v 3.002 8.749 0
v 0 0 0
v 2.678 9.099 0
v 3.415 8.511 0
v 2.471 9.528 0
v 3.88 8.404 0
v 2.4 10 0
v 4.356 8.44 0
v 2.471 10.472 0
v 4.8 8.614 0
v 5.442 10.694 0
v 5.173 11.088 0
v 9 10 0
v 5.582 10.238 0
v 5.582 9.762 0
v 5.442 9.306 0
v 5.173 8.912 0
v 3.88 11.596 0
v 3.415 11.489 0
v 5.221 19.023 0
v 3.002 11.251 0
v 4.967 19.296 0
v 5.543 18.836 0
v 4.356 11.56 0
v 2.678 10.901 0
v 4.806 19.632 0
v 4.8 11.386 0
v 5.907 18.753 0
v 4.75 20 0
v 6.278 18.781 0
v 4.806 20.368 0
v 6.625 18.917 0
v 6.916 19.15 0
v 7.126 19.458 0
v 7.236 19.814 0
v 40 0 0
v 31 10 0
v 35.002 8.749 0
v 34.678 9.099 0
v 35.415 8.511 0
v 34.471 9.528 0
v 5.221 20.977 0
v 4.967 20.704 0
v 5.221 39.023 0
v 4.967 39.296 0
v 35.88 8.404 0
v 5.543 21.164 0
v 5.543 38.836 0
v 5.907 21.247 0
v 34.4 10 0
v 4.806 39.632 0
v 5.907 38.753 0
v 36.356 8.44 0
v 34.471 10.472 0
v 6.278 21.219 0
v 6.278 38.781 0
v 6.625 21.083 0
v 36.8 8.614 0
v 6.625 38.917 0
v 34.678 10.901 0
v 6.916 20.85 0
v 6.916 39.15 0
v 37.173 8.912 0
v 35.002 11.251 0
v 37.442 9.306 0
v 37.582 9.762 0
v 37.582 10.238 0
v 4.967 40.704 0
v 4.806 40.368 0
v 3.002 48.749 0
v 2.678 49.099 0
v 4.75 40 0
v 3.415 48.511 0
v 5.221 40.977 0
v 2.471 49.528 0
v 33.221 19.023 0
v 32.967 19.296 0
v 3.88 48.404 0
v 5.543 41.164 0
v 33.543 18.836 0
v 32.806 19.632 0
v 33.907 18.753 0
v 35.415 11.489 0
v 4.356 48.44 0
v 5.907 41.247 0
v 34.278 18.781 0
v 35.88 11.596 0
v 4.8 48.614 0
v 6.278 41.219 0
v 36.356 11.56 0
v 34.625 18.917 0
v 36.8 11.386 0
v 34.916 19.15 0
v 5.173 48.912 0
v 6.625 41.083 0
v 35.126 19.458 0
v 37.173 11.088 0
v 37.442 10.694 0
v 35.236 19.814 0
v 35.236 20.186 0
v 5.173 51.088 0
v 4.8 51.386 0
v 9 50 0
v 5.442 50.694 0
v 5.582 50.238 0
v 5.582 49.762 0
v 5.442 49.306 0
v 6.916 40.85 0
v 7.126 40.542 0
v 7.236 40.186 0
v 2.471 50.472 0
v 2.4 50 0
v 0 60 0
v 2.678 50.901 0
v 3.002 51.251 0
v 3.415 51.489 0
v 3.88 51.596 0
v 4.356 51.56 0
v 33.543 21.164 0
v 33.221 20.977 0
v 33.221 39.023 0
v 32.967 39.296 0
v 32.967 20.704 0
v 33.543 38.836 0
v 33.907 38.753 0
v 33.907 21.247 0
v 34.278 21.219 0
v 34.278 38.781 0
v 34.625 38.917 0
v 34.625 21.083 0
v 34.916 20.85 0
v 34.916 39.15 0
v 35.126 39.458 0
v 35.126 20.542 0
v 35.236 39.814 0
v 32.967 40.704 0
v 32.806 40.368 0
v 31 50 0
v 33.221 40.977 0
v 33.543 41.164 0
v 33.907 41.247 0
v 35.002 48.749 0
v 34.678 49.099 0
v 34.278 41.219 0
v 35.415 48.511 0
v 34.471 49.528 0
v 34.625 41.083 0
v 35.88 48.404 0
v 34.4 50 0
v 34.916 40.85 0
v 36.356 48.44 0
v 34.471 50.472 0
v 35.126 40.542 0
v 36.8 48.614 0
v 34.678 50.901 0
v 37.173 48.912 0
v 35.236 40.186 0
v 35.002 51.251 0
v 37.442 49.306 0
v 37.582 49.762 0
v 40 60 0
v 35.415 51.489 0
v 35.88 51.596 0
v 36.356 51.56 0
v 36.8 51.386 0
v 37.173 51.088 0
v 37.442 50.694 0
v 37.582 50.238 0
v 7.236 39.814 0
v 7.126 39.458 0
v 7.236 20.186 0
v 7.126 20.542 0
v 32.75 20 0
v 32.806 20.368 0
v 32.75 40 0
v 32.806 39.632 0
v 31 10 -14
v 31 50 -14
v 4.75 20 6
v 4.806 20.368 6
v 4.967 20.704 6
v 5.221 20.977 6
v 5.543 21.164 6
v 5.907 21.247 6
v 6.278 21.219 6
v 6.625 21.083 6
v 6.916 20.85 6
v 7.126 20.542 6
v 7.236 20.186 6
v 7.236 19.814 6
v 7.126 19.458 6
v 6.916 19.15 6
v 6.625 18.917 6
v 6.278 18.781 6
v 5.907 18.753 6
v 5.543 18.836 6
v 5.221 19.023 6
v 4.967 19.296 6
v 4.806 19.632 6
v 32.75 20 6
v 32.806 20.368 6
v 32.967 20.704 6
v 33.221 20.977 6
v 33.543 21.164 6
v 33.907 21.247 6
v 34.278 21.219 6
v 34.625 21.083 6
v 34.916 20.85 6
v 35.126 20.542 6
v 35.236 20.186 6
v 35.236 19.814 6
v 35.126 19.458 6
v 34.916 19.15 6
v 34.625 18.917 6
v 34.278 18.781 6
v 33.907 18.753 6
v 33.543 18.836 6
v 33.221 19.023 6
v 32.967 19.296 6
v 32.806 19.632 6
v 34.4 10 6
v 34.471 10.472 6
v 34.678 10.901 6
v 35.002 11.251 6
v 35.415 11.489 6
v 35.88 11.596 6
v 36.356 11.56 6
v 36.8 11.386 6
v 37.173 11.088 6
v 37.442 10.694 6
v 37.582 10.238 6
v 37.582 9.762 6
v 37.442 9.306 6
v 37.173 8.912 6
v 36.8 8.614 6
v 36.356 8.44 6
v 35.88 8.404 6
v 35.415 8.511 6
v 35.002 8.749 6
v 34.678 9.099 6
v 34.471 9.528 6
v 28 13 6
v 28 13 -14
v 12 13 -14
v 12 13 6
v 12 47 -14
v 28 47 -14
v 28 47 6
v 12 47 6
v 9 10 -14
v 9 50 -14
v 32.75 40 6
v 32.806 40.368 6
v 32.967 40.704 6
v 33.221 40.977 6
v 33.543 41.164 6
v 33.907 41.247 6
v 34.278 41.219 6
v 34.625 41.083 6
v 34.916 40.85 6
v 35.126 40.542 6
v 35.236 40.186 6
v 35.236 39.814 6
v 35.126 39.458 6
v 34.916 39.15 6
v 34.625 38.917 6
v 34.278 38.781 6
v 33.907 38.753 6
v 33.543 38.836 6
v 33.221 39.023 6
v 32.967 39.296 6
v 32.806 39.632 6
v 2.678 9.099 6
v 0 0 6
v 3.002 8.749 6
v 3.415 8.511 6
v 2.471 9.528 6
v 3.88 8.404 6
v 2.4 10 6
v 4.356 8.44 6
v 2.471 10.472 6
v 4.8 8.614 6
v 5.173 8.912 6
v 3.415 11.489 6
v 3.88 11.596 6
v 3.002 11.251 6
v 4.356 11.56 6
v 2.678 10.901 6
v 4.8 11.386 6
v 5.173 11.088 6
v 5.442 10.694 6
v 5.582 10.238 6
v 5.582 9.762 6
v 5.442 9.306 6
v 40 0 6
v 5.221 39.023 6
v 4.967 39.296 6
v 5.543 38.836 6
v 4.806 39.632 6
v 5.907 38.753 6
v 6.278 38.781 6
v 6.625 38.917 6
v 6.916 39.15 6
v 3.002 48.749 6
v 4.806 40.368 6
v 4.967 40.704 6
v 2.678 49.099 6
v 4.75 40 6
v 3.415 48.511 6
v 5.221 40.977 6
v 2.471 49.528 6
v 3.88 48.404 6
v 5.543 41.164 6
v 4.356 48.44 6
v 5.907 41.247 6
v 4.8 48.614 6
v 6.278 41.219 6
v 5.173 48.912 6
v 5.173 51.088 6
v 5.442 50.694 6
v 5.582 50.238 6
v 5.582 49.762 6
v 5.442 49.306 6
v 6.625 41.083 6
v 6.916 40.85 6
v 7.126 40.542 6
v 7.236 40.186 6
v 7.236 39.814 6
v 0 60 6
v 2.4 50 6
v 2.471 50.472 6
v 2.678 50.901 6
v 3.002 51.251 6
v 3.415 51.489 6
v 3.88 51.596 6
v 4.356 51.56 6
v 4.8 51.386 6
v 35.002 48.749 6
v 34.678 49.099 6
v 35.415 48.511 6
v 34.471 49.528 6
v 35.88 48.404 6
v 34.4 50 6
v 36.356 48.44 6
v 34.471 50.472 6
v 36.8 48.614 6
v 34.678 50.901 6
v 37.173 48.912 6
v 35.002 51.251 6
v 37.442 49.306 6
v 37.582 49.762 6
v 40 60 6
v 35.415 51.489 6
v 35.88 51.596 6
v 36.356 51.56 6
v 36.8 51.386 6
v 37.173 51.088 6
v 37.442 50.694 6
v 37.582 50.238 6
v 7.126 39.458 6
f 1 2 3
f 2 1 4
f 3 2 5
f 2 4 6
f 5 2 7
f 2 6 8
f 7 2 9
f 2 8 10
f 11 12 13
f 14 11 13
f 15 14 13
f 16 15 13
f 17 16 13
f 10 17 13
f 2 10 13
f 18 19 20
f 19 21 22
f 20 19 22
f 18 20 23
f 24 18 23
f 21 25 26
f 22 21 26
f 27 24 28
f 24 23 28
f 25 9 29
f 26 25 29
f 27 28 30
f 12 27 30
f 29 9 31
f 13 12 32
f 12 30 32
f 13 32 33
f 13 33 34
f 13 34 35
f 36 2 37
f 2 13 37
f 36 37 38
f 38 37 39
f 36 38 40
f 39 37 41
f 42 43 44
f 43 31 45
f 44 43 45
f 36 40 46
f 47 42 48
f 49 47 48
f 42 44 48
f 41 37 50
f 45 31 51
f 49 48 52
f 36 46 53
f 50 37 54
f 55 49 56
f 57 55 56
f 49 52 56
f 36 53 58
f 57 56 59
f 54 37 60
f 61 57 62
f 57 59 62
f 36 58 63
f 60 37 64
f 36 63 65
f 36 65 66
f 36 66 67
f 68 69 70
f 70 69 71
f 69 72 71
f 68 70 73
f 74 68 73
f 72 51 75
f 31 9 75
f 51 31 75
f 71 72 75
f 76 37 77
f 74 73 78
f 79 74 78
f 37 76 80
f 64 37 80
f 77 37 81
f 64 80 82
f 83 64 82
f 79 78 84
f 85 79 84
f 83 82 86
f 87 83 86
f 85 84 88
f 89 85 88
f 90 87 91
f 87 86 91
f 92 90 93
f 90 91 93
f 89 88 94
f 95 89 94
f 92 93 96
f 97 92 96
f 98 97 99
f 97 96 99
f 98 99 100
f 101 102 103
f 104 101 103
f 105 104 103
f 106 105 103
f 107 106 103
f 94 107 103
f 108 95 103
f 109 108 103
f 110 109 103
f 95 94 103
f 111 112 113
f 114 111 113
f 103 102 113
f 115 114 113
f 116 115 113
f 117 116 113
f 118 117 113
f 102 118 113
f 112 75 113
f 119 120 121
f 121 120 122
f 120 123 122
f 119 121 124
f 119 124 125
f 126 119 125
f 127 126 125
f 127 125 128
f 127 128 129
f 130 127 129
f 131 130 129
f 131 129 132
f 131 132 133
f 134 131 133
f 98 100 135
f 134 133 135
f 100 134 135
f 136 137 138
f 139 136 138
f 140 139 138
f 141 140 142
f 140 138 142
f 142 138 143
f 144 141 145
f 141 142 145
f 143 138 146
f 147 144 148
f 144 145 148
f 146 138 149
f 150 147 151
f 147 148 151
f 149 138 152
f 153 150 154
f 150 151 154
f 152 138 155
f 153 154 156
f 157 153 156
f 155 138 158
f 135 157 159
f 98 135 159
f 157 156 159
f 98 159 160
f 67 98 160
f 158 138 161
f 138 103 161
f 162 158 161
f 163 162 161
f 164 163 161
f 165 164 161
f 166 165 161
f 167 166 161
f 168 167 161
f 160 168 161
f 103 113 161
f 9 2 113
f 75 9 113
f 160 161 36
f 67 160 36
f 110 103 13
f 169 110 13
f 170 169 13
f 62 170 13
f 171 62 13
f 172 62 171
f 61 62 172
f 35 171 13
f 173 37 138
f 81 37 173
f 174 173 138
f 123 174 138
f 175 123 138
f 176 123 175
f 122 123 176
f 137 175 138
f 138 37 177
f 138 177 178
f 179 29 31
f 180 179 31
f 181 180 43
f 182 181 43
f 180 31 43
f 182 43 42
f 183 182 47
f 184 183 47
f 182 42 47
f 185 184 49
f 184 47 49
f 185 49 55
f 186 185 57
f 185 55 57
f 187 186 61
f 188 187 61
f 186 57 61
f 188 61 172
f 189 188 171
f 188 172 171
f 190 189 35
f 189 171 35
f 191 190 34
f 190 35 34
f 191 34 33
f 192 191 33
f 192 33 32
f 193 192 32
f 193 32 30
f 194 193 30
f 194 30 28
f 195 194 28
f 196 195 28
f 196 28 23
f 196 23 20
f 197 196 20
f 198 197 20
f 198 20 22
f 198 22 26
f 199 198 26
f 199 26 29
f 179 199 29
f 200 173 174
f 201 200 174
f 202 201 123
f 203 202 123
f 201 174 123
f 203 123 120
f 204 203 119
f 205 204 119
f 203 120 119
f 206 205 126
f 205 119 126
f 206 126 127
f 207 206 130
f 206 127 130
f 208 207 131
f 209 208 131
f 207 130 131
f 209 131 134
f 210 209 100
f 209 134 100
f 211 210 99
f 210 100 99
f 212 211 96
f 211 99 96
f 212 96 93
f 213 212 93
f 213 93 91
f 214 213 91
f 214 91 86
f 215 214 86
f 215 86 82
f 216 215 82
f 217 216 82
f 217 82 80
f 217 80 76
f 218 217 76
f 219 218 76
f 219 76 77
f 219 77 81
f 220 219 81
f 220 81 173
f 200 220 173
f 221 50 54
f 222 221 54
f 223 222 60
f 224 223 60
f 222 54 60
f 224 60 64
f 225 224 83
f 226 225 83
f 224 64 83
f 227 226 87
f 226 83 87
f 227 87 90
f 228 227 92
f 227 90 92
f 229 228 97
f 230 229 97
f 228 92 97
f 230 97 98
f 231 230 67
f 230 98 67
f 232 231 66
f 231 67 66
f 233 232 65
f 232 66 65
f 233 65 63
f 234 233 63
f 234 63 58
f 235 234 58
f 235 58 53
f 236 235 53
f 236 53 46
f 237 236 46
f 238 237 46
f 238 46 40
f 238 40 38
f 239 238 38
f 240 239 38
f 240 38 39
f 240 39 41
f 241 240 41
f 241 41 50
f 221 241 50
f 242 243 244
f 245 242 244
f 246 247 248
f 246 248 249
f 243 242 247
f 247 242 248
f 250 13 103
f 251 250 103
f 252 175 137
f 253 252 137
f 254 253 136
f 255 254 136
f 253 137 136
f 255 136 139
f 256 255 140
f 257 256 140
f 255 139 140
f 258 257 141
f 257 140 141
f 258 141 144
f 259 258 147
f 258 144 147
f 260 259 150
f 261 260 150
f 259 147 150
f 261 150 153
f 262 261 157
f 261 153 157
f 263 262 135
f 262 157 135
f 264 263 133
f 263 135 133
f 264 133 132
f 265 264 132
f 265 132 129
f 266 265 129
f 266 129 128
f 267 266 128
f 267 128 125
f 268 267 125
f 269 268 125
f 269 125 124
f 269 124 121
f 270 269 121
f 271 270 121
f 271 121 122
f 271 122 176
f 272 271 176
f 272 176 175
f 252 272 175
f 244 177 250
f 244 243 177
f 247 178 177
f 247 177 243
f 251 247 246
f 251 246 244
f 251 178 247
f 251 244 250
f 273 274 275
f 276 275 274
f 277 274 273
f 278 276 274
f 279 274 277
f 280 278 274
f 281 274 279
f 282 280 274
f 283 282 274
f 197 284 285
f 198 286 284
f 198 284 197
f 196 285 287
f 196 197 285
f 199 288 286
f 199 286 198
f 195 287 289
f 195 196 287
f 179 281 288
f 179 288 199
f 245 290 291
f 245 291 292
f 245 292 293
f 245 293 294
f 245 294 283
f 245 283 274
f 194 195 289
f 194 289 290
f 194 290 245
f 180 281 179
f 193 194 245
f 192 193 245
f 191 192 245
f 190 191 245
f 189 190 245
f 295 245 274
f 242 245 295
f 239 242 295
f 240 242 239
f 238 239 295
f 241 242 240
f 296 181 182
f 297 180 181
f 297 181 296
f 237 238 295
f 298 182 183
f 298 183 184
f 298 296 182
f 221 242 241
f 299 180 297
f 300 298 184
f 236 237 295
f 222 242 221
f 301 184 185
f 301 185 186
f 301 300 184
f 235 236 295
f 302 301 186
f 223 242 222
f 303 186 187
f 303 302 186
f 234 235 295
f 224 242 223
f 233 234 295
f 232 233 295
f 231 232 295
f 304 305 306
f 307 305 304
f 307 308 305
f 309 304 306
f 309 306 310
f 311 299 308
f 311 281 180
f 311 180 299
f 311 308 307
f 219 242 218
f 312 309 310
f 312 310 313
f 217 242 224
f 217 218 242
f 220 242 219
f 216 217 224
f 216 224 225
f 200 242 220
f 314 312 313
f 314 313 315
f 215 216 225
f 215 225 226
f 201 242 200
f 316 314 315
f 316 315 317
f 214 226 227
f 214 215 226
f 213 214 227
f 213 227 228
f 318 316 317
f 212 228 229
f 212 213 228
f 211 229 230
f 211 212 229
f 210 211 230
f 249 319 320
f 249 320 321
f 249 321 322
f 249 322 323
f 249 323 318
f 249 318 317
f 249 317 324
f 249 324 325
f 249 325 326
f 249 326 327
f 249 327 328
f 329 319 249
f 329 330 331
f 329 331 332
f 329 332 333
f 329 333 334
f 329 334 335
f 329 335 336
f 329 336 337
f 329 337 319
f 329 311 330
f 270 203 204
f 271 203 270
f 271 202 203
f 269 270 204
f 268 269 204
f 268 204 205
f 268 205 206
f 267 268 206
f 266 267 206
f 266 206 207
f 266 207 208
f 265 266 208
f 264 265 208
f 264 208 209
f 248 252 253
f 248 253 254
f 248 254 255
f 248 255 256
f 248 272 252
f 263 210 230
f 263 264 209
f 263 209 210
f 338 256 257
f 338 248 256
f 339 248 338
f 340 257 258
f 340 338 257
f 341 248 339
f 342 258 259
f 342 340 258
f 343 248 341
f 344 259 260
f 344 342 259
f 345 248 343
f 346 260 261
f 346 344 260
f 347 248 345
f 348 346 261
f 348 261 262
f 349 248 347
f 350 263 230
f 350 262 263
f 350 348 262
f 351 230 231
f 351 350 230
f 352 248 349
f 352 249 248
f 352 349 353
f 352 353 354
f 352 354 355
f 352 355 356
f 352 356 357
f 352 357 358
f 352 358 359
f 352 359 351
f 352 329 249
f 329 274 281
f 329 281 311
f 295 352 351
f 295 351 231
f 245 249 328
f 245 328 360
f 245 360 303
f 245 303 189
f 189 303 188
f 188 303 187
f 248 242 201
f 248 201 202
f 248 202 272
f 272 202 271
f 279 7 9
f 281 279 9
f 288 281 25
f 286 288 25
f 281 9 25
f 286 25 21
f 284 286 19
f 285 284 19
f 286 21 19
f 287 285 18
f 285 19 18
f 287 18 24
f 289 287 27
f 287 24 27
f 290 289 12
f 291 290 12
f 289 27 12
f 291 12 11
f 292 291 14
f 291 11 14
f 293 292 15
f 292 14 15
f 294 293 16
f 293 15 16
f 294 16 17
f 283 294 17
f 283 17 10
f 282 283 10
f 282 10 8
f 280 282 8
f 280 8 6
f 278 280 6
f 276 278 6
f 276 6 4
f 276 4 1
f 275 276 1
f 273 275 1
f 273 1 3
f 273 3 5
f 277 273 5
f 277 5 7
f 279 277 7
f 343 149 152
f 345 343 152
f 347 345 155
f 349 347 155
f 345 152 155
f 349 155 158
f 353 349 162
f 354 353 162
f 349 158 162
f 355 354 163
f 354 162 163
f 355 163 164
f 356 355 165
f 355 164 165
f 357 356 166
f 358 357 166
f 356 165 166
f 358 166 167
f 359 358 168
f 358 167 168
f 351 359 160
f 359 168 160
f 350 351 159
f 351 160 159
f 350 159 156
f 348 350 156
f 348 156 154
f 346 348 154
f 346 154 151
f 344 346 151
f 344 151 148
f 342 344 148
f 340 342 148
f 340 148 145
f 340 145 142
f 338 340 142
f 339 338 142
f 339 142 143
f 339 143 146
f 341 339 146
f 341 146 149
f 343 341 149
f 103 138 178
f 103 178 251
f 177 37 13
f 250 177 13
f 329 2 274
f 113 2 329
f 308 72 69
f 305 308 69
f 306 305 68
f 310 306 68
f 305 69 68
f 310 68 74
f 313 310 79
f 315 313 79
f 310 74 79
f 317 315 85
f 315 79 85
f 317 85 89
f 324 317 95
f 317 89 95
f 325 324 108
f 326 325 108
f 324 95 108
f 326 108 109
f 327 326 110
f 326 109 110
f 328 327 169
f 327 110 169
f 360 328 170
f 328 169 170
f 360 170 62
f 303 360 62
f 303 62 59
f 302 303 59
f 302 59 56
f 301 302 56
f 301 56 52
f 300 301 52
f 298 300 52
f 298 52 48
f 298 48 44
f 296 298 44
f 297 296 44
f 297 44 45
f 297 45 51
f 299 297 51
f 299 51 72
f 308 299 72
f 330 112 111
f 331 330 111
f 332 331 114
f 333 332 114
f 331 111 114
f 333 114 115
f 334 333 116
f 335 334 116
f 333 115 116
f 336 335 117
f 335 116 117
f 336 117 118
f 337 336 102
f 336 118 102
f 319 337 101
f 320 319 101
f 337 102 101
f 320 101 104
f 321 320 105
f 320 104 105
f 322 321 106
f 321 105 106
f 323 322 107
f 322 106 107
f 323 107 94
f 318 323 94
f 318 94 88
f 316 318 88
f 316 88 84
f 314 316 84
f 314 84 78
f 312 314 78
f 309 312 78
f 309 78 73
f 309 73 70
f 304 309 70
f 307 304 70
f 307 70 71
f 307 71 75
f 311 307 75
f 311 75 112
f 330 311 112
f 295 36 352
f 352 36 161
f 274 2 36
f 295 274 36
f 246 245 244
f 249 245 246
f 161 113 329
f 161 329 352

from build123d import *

# Parameters (mm, degrees)
SKETCH1_W               = 40
SKETCH1_H               = 60
BOSS_EXTRUDE1_DEPTH     = 6
M3_CLEARANCE_HOLE1_D    = 3.2
CUT_EXTRUDE1_DEPTH      = 73.360210061
CUT_EXTRUDE1_DEPTH_BACK = 73.360210061
SKETCH4_W               = 22
SKETCH4_H               = 40
SKETCH6_W               = 22
SKETCH6_H               = 40
SKETCH6_W_2             = 16
SKETCH6_H_2             = 34
BOSS_EXTRUDE2_DEPTH     = 20
TAP_DRILL_FOR_M3_TAP2_D = 2.5


with BuildPart() as part:
    # Sketch1 → Boss-Extrude1 (new body)
    with BuildSketch(Plane.XY):
        with Locations((20, 30)):
            Rectangle(SKETCH1_W, SKETCH1_H)
    extrude(amount=BOSS_EXTRUDE1_DEPTH)

    # M3 Clearance Hole1 (through all)
    with Locations(Plane.XY.offset(6)):
        with Locations((4, 10), (4, 50), (36, 50), (36, 10)):
            Hole(M3_CLEARANCE_HOLE1_D / 2)

    # Sketch4 → Cut-Extrude1 (cut, two sides: drawn at the far end of the back side and taken through both)
    with BuildSketch(Plane.XY.offset(6).offset(-CUT_EXTRUDE1_DEPTH_BACK)):
        with Locations((20, 30)):
            Rectangle(SKETCH4_W, SKETCH4_H)
    extrude(amount=CUT_EXTRUDE1_DEPTH + CUT_EXTRUDE1_DEPTH_BACK, mode=Mode.SUBTRACT)

    # Sketch6 → Boss-Extrude2 (add)
    with BuildSketch(Plane(origin=(0, 0, 6), x_dir=(-1, 0, 0), z_dir=(0, 0, -1))):
        with Locations((-20, 30)):
            Rectangle(SKETCH6_W, SKETCH6_H)
        with Locations((-20, 30)):
            Rectangle(SKETCH6_W_2, SKETCH6_H_2, mode=Mode.SUBTRACT)
    extrude(amount=BOSS_EXTRUDE2_DEPTH)

    # Tap Drill for M3 Tap2 (through all)
    with Locations(Plane.XY.offset(6)):
        with Locations((34, 40), (6, 40), (6, 20), (34, 20)):
            Hole(TAP_DRILL_FOR_M3_TAP2_D / 2)


solid = part.part
